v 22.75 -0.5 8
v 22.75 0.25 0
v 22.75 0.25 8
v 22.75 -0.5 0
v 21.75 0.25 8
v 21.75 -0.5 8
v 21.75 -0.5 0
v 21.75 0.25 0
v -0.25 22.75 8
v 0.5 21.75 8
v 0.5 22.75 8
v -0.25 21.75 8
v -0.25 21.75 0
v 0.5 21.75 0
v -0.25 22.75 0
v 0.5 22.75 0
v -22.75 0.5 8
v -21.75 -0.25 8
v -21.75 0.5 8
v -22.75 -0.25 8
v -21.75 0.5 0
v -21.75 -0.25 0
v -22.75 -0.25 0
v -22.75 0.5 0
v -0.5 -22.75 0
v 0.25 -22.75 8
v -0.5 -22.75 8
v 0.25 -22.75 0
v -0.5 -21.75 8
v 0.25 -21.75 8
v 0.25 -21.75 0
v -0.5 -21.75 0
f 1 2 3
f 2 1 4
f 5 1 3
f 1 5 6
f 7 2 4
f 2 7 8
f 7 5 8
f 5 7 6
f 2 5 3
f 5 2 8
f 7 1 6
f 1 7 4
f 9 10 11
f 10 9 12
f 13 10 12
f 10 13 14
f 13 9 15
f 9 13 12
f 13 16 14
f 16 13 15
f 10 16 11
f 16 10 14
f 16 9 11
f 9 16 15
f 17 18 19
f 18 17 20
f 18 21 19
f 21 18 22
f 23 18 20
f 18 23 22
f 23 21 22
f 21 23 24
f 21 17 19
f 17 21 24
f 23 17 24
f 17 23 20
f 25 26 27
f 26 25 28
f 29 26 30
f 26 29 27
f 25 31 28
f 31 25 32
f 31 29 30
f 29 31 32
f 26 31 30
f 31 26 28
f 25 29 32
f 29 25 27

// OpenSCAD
     for (theta=[0:90:270]){
          rotate([0,0,theta])translate([21.75,-.5,0])cube(size=[1,.75,8]);
        }
